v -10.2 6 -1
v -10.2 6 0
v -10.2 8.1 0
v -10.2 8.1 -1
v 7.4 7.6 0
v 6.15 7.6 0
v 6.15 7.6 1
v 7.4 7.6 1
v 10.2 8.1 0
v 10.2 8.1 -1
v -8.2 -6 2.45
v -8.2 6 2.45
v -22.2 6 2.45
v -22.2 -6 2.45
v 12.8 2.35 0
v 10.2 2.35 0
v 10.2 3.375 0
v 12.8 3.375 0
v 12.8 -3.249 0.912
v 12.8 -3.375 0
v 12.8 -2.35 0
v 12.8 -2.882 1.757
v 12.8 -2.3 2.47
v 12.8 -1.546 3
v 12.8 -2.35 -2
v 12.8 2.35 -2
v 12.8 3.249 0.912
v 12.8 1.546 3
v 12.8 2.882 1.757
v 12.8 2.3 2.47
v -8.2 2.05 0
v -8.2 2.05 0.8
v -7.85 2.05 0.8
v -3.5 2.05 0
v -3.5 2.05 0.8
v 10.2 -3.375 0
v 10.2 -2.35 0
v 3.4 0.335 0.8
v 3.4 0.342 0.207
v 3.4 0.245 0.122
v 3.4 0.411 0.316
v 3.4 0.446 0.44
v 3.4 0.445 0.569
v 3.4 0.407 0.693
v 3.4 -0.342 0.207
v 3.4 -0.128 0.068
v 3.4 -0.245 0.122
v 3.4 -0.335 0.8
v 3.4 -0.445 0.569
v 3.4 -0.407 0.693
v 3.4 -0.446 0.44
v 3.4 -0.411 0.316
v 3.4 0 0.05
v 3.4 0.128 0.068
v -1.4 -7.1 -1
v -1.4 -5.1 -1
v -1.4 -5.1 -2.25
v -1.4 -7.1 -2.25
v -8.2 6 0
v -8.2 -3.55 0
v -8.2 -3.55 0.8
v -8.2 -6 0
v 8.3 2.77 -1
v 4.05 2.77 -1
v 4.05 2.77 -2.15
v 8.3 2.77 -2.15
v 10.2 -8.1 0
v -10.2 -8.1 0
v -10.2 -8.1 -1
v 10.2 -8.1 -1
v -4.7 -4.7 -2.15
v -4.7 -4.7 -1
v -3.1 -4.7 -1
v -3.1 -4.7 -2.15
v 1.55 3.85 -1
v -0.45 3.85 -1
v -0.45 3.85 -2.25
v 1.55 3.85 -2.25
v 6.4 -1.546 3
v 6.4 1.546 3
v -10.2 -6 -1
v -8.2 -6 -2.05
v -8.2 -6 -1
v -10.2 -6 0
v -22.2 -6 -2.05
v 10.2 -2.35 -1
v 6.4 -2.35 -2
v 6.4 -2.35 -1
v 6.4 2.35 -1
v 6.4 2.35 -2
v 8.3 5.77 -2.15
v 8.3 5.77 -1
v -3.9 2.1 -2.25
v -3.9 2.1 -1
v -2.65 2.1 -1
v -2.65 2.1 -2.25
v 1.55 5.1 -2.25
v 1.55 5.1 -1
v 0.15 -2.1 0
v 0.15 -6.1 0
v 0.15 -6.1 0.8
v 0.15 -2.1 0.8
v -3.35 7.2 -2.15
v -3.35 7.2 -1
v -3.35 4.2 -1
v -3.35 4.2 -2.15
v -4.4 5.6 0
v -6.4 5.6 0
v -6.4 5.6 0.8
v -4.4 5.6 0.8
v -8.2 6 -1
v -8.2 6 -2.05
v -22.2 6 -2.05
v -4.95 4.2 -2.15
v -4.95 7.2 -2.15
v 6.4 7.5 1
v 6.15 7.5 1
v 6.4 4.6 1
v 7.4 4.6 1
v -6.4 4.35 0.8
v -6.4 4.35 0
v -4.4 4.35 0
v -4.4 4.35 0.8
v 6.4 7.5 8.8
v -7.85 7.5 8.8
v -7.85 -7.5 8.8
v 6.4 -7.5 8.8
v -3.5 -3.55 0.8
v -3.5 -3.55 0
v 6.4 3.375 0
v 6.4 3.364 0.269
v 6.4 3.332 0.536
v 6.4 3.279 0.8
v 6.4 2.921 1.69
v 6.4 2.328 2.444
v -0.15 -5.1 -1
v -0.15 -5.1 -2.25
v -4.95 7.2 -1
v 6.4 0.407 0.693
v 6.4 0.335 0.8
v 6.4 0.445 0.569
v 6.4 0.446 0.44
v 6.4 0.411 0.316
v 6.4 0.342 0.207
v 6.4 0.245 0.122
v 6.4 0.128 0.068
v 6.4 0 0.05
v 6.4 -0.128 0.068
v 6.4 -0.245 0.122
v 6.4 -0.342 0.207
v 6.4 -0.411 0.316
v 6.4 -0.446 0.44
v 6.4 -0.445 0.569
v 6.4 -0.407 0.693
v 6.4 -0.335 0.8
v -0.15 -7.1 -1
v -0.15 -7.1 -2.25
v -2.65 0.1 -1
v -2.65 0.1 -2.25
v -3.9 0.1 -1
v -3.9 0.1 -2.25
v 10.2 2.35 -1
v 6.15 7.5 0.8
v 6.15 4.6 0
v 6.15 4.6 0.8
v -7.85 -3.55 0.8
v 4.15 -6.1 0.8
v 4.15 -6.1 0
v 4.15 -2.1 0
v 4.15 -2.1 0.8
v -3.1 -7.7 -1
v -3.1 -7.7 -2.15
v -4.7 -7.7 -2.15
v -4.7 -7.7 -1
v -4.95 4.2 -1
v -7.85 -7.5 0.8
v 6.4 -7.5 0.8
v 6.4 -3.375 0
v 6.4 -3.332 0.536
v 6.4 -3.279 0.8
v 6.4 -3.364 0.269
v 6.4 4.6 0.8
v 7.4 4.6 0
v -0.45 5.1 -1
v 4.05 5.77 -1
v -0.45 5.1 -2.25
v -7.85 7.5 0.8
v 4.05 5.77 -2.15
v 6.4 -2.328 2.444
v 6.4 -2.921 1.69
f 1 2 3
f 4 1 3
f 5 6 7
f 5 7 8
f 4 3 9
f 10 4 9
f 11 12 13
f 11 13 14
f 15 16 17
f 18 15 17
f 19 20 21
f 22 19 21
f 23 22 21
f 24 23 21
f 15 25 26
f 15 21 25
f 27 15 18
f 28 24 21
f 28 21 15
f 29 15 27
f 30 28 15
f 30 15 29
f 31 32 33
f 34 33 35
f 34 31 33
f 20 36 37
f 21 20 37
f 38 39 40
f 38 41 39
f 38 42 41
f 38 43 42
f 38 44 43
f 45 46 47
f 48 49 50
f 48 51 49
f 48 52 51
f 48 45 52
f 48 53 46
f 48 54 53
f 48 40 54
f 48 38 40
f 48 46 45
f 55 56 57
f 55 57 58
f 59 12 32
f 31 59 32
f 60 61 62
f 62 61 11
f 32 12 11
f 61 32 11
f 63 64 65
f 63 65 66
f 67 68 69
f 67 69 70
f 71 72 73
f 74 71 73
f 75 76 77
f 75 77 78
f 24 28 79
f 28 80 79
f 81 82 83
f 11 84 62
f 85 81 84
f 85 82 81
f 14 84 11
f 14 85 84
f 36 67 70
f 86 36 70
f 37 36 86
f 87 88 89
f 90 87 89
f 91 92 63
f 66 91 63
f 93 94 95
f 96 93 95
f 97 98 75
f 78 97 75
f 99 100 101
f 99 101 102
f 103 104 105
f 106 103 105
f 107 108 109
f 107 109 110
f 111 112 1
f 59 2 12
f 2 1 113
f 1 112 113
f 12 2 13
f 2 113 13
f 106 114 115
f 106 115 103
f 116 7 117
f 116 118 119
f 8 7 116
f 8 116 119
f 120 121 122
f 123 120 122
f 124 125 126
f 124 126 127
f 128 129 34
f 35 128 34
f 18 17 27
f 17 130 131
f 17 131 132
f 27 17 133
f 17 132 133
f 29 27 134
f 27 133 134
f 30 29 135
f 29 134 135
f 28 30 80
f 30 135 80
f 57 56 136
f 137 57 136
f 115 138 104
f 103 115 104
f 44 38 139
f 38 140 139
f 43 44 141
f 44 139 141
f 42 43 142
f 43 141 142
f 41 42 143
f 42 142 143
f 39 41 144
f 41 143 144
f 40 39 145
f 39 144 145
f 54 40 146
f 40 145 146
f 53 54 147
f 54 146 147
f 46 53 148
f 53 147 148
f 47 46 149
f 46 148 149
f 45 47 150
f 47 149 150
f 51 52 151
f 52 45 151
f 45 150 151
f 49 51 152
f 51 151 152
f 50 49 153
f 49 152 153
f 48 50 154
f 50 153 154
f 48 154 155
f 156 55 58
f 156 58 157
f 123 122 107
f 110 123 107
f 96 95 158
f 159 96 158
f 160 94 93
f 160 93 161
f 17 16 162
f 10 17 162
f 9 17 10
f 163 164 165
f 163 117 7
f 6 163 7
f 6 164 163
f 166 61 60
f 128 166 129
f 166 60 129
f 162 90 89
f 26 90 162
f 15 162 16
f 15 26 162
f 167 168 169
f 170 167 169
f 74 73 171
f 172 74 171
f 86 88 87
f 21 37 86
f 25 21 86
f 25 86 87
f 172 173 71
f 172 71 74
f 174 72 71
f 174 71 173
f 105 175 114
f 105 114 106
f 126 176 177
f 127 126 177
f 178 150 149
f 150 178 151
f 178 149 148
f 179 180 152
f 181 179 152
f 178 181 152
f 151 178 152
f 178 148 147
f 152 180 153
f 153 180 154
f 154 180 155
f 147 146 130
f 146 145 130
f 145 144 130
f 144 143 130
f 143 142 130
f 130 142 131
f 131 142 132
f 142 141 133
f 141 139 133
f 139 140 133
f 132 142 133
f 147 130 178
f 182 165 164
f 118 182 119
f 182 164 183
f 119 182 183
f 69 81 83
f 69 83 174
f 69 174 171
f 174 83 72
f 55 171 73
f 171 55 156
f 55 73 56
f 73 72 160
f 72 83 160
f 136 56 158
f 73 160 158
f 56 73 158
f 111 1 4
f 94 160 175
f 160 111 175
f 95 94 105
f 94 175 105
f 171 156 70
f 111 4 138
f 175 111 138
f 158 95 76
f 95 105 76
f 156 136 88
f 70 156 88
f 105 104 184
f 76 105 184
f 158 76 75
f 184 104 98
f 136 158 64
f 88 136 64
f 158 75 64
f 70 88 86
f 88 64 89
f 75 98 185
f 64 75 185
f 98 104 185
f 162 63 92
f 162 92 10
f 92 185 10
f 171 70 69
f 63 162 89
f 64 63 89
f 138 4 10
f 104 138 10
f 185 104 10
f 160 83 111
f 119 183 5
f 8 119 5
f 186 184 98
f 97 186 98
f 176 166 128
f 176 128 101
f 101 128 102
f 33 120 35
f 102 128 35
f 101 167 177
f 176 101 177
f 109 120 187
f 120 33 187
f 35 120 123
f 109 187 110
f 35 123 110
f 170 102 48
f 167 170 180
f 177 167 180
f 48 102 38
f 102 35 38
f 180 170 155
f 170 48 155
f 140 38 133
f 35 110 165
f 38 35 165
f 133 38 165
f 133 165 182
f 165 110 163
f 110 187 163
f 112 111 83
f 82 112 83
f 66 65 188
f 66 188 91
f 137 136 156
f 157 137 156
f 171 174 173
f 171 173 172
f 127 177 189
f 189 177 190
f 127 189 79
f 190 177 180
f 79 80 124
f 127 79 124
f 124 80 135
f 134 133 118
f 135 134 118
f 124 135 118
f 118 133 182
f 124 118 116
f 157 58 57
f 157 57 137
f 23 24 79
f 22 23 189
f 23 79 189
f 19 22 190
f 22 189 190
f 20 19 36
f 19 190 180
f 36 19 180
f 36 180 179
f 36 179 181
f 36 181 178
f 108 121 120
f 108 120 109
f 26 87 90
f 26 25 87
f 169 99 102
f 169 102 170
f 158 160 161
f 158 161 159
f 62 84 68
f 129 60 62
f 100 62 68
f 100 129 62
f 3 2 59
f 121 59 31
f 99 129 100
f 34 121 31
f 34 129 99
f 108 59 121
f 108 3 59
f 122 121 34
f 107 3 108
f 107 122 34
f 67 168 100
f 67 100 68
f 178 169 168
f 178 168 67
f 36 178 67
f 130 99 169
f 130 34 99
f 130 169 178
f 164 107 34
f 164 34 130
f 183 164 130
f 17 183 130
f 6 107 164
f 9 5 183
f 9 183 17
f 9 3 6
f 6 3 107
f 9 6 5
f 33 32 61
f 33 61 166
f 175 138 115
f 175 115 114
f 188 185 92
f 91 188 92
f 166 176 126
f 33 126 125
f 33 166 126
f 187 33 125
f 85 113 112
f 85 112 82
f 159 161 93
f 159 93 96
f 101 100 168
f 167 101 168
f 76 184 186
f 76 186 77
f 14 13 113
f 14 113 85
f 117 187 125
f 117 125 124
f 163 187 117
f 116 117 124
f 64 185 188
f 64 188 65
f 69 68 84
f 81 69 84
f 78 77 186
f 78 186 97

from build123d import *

# Parameters (mm, degrees)
F0_W          = 20.4
F0_H          = 16.2
F1_DEPTH      = 1
F2_W          = 12
F2_H          = 4.5
F3_DEPTH      = 12
F3_DEPTH_BACK = 2
F4_W          = 4.7
F4_H          = 1
F5_DEPTH      = 2.6
F5_DEPTH_BACK = 3.8
F6_R          = 0.45
F7_DEPTH      = 3
F8_W          = 5.6
F8_H          = 5.6
F9_DEPTH      = 0.8
F10_W         = 4
F10_H         = 4
F11_DEPTH     = 0.8
F12_W         = 2
F12_H         = 1.25
F13_DEPTH     = 1.25
F14_W         = 1.25
F14_H         = 3
F15_DEPTH     = 1
F16_W         = 2
F16_H         = 1.25
F16_W_2       = 1.25
F16_H_2       = 2
F17_DEPTH     = 1.25
F18_W         = 1.6
F18_H         = 3
F19_DEPTH     = 1.15
F20_W         = 4.25
F20_H         = 3
F21_DEPTH     = 1.15
F22_W         = 14.25
F22_H         = 15
F23_DEPTH     = 8


with BuildPart() as f1:
    # F0 (on Top) → F1 (new body)
    with BuildSketch(Plane.XY):
        Rectangle(F0_W, F0_H)
    extrude(amount=-F1_DEPTH)

    # F2 (on face) → F3 (join, two sides)
    with BuildSketch(Plane(origin=(-10.2, 0, 0), x_dir=(0, -1, 0), z_dir=(-1, 0, 0))) as f3_sk:
        with Locations((0, 0.2)):
            Rectangle(F2_W, F2_H)
    extrude(amount=F3_DEPTH)
    extrude(f3_sk.sketch, amount=-F3_DEPTH_BACK)

    # F4 (on face) → F5 (join, two sides)
    with BuildSketch(Plane.YZ.offset(10.2)) as f5_sk:
        with Locations((0, -1.5)):
            Rectangle(F4_W, F4_H)
        with Locations((0, -0.5)):
            Rectangle(F4_W, F4_H)
        with BuildLine():
            Line((-3.375, 0), (-2.35, 0))
            Line((-2.35, 0), (2.35, 0))
            Line((2.35, 0), (3.375, 0))
            ThreePointArc((3.375, 0), (2.8817469144, 1.7567469144), (1.5461646096, 3))
            Line((1.5461646096, 3), (-1.5461646096, 3))
            ThreePointArc((-1.5461646096, 3), (-2.8817469144, 1.7567469144), (-3.375, 0))
        make_face()
    extrude(amount=F5_DEPTH)
    extrude(f5_sk.sketch, amount=-F5_DEPTH_BACK)

    # F6 (on face) → F7 (join)
    with BuildSketch(Plane(origin=(6.4, 0, 0), x_dir=(0, -1, 0), z_dir=(-1, 0, 0))):
        with Locations((0, 0.5)):
            Circle(F6_R)
    extrude(amount=F7_DEPTH)

    # F8 (on face) → F9 (join)
    with BuildSketch(Plane.XY):
        with Locations((-6.3, -0.75)):
            Rectangle(F8_W, F8_H)
    extrude(amount=F9_DEPTH)

    # F10 (on face) → F11 (join)
    with BuildSketch(Plane.XY):
        with Locations((2.15, -4.1)):
            Rectangle(F10_W, F10_H)
    extrude(amount=F11_DEPTH)

    # F12 (on face) → F13 (join)
    with BuildSketch(Plane.XY):
        with Locations((-5.4, 4.975)):
            Rectangle(F12_W, F12_H)
    extrude(amount=F13_DEPTH)

    # F14 (on face) → F15 (join)
    with BuildSketch(Plane.XY):
        with Locations((6.775, 6.1)):
            Rectangle(F14_W, F14_H)
    extrude(amount=F15_DEPTH)

    # F16 (on face) → F17 (join)
    with BuildSketch(Plane(origin=(0, 0, -1), x_dir=(1, 0, 0), z_dir=(0, 0, -1))):
        with Locations((0.55, -4.475)):
            Rectangle(F16_W, F16_H)
        with Locations((-3.275, -1.1)):
            Rectangle(F16_W_2, F16_H_2)
        with Locations((-0.775, 6.1)):
            Rectangle(F16_W_2, F16_H_2)
    extrude(amount=F17_DEPTH)

    # F18 (on face) → F19 (join)
    with BuildSketch(Plane(origin=(0, 0, -1), x_dir=(1, 0, 0), z_dir=(0, 0, -1))):
        with Locations((-4.15, -5.7)):
            Rectangle(F18_W, F18_H)
        with Locations((-3.9, 6.2)):
            Rectangle(F18_W, F18_H)
    extrude(amount=F19_DEPTH)

    # F20 (on face) → F21 (join)
    with BuildSketch(Plane(origin=(0, 0, -1), x_dir=(1, 0, 0), z_dir=(0, 0, -1))):
        with Locations((6.175, -4.27)):
            Rectangle(F20_W, F20_H)
    extrude(amount=F21_DEPTH)

    # F22 (on face) → F23 (join)
    with BuildSketch(Plane.XY.offset(0.8)):
        with Locations((-0.725, 0)):
            Rectangle(F22_W, F22_H)
    extrude(amount=F23_DEPTH)


solid = f1.part
